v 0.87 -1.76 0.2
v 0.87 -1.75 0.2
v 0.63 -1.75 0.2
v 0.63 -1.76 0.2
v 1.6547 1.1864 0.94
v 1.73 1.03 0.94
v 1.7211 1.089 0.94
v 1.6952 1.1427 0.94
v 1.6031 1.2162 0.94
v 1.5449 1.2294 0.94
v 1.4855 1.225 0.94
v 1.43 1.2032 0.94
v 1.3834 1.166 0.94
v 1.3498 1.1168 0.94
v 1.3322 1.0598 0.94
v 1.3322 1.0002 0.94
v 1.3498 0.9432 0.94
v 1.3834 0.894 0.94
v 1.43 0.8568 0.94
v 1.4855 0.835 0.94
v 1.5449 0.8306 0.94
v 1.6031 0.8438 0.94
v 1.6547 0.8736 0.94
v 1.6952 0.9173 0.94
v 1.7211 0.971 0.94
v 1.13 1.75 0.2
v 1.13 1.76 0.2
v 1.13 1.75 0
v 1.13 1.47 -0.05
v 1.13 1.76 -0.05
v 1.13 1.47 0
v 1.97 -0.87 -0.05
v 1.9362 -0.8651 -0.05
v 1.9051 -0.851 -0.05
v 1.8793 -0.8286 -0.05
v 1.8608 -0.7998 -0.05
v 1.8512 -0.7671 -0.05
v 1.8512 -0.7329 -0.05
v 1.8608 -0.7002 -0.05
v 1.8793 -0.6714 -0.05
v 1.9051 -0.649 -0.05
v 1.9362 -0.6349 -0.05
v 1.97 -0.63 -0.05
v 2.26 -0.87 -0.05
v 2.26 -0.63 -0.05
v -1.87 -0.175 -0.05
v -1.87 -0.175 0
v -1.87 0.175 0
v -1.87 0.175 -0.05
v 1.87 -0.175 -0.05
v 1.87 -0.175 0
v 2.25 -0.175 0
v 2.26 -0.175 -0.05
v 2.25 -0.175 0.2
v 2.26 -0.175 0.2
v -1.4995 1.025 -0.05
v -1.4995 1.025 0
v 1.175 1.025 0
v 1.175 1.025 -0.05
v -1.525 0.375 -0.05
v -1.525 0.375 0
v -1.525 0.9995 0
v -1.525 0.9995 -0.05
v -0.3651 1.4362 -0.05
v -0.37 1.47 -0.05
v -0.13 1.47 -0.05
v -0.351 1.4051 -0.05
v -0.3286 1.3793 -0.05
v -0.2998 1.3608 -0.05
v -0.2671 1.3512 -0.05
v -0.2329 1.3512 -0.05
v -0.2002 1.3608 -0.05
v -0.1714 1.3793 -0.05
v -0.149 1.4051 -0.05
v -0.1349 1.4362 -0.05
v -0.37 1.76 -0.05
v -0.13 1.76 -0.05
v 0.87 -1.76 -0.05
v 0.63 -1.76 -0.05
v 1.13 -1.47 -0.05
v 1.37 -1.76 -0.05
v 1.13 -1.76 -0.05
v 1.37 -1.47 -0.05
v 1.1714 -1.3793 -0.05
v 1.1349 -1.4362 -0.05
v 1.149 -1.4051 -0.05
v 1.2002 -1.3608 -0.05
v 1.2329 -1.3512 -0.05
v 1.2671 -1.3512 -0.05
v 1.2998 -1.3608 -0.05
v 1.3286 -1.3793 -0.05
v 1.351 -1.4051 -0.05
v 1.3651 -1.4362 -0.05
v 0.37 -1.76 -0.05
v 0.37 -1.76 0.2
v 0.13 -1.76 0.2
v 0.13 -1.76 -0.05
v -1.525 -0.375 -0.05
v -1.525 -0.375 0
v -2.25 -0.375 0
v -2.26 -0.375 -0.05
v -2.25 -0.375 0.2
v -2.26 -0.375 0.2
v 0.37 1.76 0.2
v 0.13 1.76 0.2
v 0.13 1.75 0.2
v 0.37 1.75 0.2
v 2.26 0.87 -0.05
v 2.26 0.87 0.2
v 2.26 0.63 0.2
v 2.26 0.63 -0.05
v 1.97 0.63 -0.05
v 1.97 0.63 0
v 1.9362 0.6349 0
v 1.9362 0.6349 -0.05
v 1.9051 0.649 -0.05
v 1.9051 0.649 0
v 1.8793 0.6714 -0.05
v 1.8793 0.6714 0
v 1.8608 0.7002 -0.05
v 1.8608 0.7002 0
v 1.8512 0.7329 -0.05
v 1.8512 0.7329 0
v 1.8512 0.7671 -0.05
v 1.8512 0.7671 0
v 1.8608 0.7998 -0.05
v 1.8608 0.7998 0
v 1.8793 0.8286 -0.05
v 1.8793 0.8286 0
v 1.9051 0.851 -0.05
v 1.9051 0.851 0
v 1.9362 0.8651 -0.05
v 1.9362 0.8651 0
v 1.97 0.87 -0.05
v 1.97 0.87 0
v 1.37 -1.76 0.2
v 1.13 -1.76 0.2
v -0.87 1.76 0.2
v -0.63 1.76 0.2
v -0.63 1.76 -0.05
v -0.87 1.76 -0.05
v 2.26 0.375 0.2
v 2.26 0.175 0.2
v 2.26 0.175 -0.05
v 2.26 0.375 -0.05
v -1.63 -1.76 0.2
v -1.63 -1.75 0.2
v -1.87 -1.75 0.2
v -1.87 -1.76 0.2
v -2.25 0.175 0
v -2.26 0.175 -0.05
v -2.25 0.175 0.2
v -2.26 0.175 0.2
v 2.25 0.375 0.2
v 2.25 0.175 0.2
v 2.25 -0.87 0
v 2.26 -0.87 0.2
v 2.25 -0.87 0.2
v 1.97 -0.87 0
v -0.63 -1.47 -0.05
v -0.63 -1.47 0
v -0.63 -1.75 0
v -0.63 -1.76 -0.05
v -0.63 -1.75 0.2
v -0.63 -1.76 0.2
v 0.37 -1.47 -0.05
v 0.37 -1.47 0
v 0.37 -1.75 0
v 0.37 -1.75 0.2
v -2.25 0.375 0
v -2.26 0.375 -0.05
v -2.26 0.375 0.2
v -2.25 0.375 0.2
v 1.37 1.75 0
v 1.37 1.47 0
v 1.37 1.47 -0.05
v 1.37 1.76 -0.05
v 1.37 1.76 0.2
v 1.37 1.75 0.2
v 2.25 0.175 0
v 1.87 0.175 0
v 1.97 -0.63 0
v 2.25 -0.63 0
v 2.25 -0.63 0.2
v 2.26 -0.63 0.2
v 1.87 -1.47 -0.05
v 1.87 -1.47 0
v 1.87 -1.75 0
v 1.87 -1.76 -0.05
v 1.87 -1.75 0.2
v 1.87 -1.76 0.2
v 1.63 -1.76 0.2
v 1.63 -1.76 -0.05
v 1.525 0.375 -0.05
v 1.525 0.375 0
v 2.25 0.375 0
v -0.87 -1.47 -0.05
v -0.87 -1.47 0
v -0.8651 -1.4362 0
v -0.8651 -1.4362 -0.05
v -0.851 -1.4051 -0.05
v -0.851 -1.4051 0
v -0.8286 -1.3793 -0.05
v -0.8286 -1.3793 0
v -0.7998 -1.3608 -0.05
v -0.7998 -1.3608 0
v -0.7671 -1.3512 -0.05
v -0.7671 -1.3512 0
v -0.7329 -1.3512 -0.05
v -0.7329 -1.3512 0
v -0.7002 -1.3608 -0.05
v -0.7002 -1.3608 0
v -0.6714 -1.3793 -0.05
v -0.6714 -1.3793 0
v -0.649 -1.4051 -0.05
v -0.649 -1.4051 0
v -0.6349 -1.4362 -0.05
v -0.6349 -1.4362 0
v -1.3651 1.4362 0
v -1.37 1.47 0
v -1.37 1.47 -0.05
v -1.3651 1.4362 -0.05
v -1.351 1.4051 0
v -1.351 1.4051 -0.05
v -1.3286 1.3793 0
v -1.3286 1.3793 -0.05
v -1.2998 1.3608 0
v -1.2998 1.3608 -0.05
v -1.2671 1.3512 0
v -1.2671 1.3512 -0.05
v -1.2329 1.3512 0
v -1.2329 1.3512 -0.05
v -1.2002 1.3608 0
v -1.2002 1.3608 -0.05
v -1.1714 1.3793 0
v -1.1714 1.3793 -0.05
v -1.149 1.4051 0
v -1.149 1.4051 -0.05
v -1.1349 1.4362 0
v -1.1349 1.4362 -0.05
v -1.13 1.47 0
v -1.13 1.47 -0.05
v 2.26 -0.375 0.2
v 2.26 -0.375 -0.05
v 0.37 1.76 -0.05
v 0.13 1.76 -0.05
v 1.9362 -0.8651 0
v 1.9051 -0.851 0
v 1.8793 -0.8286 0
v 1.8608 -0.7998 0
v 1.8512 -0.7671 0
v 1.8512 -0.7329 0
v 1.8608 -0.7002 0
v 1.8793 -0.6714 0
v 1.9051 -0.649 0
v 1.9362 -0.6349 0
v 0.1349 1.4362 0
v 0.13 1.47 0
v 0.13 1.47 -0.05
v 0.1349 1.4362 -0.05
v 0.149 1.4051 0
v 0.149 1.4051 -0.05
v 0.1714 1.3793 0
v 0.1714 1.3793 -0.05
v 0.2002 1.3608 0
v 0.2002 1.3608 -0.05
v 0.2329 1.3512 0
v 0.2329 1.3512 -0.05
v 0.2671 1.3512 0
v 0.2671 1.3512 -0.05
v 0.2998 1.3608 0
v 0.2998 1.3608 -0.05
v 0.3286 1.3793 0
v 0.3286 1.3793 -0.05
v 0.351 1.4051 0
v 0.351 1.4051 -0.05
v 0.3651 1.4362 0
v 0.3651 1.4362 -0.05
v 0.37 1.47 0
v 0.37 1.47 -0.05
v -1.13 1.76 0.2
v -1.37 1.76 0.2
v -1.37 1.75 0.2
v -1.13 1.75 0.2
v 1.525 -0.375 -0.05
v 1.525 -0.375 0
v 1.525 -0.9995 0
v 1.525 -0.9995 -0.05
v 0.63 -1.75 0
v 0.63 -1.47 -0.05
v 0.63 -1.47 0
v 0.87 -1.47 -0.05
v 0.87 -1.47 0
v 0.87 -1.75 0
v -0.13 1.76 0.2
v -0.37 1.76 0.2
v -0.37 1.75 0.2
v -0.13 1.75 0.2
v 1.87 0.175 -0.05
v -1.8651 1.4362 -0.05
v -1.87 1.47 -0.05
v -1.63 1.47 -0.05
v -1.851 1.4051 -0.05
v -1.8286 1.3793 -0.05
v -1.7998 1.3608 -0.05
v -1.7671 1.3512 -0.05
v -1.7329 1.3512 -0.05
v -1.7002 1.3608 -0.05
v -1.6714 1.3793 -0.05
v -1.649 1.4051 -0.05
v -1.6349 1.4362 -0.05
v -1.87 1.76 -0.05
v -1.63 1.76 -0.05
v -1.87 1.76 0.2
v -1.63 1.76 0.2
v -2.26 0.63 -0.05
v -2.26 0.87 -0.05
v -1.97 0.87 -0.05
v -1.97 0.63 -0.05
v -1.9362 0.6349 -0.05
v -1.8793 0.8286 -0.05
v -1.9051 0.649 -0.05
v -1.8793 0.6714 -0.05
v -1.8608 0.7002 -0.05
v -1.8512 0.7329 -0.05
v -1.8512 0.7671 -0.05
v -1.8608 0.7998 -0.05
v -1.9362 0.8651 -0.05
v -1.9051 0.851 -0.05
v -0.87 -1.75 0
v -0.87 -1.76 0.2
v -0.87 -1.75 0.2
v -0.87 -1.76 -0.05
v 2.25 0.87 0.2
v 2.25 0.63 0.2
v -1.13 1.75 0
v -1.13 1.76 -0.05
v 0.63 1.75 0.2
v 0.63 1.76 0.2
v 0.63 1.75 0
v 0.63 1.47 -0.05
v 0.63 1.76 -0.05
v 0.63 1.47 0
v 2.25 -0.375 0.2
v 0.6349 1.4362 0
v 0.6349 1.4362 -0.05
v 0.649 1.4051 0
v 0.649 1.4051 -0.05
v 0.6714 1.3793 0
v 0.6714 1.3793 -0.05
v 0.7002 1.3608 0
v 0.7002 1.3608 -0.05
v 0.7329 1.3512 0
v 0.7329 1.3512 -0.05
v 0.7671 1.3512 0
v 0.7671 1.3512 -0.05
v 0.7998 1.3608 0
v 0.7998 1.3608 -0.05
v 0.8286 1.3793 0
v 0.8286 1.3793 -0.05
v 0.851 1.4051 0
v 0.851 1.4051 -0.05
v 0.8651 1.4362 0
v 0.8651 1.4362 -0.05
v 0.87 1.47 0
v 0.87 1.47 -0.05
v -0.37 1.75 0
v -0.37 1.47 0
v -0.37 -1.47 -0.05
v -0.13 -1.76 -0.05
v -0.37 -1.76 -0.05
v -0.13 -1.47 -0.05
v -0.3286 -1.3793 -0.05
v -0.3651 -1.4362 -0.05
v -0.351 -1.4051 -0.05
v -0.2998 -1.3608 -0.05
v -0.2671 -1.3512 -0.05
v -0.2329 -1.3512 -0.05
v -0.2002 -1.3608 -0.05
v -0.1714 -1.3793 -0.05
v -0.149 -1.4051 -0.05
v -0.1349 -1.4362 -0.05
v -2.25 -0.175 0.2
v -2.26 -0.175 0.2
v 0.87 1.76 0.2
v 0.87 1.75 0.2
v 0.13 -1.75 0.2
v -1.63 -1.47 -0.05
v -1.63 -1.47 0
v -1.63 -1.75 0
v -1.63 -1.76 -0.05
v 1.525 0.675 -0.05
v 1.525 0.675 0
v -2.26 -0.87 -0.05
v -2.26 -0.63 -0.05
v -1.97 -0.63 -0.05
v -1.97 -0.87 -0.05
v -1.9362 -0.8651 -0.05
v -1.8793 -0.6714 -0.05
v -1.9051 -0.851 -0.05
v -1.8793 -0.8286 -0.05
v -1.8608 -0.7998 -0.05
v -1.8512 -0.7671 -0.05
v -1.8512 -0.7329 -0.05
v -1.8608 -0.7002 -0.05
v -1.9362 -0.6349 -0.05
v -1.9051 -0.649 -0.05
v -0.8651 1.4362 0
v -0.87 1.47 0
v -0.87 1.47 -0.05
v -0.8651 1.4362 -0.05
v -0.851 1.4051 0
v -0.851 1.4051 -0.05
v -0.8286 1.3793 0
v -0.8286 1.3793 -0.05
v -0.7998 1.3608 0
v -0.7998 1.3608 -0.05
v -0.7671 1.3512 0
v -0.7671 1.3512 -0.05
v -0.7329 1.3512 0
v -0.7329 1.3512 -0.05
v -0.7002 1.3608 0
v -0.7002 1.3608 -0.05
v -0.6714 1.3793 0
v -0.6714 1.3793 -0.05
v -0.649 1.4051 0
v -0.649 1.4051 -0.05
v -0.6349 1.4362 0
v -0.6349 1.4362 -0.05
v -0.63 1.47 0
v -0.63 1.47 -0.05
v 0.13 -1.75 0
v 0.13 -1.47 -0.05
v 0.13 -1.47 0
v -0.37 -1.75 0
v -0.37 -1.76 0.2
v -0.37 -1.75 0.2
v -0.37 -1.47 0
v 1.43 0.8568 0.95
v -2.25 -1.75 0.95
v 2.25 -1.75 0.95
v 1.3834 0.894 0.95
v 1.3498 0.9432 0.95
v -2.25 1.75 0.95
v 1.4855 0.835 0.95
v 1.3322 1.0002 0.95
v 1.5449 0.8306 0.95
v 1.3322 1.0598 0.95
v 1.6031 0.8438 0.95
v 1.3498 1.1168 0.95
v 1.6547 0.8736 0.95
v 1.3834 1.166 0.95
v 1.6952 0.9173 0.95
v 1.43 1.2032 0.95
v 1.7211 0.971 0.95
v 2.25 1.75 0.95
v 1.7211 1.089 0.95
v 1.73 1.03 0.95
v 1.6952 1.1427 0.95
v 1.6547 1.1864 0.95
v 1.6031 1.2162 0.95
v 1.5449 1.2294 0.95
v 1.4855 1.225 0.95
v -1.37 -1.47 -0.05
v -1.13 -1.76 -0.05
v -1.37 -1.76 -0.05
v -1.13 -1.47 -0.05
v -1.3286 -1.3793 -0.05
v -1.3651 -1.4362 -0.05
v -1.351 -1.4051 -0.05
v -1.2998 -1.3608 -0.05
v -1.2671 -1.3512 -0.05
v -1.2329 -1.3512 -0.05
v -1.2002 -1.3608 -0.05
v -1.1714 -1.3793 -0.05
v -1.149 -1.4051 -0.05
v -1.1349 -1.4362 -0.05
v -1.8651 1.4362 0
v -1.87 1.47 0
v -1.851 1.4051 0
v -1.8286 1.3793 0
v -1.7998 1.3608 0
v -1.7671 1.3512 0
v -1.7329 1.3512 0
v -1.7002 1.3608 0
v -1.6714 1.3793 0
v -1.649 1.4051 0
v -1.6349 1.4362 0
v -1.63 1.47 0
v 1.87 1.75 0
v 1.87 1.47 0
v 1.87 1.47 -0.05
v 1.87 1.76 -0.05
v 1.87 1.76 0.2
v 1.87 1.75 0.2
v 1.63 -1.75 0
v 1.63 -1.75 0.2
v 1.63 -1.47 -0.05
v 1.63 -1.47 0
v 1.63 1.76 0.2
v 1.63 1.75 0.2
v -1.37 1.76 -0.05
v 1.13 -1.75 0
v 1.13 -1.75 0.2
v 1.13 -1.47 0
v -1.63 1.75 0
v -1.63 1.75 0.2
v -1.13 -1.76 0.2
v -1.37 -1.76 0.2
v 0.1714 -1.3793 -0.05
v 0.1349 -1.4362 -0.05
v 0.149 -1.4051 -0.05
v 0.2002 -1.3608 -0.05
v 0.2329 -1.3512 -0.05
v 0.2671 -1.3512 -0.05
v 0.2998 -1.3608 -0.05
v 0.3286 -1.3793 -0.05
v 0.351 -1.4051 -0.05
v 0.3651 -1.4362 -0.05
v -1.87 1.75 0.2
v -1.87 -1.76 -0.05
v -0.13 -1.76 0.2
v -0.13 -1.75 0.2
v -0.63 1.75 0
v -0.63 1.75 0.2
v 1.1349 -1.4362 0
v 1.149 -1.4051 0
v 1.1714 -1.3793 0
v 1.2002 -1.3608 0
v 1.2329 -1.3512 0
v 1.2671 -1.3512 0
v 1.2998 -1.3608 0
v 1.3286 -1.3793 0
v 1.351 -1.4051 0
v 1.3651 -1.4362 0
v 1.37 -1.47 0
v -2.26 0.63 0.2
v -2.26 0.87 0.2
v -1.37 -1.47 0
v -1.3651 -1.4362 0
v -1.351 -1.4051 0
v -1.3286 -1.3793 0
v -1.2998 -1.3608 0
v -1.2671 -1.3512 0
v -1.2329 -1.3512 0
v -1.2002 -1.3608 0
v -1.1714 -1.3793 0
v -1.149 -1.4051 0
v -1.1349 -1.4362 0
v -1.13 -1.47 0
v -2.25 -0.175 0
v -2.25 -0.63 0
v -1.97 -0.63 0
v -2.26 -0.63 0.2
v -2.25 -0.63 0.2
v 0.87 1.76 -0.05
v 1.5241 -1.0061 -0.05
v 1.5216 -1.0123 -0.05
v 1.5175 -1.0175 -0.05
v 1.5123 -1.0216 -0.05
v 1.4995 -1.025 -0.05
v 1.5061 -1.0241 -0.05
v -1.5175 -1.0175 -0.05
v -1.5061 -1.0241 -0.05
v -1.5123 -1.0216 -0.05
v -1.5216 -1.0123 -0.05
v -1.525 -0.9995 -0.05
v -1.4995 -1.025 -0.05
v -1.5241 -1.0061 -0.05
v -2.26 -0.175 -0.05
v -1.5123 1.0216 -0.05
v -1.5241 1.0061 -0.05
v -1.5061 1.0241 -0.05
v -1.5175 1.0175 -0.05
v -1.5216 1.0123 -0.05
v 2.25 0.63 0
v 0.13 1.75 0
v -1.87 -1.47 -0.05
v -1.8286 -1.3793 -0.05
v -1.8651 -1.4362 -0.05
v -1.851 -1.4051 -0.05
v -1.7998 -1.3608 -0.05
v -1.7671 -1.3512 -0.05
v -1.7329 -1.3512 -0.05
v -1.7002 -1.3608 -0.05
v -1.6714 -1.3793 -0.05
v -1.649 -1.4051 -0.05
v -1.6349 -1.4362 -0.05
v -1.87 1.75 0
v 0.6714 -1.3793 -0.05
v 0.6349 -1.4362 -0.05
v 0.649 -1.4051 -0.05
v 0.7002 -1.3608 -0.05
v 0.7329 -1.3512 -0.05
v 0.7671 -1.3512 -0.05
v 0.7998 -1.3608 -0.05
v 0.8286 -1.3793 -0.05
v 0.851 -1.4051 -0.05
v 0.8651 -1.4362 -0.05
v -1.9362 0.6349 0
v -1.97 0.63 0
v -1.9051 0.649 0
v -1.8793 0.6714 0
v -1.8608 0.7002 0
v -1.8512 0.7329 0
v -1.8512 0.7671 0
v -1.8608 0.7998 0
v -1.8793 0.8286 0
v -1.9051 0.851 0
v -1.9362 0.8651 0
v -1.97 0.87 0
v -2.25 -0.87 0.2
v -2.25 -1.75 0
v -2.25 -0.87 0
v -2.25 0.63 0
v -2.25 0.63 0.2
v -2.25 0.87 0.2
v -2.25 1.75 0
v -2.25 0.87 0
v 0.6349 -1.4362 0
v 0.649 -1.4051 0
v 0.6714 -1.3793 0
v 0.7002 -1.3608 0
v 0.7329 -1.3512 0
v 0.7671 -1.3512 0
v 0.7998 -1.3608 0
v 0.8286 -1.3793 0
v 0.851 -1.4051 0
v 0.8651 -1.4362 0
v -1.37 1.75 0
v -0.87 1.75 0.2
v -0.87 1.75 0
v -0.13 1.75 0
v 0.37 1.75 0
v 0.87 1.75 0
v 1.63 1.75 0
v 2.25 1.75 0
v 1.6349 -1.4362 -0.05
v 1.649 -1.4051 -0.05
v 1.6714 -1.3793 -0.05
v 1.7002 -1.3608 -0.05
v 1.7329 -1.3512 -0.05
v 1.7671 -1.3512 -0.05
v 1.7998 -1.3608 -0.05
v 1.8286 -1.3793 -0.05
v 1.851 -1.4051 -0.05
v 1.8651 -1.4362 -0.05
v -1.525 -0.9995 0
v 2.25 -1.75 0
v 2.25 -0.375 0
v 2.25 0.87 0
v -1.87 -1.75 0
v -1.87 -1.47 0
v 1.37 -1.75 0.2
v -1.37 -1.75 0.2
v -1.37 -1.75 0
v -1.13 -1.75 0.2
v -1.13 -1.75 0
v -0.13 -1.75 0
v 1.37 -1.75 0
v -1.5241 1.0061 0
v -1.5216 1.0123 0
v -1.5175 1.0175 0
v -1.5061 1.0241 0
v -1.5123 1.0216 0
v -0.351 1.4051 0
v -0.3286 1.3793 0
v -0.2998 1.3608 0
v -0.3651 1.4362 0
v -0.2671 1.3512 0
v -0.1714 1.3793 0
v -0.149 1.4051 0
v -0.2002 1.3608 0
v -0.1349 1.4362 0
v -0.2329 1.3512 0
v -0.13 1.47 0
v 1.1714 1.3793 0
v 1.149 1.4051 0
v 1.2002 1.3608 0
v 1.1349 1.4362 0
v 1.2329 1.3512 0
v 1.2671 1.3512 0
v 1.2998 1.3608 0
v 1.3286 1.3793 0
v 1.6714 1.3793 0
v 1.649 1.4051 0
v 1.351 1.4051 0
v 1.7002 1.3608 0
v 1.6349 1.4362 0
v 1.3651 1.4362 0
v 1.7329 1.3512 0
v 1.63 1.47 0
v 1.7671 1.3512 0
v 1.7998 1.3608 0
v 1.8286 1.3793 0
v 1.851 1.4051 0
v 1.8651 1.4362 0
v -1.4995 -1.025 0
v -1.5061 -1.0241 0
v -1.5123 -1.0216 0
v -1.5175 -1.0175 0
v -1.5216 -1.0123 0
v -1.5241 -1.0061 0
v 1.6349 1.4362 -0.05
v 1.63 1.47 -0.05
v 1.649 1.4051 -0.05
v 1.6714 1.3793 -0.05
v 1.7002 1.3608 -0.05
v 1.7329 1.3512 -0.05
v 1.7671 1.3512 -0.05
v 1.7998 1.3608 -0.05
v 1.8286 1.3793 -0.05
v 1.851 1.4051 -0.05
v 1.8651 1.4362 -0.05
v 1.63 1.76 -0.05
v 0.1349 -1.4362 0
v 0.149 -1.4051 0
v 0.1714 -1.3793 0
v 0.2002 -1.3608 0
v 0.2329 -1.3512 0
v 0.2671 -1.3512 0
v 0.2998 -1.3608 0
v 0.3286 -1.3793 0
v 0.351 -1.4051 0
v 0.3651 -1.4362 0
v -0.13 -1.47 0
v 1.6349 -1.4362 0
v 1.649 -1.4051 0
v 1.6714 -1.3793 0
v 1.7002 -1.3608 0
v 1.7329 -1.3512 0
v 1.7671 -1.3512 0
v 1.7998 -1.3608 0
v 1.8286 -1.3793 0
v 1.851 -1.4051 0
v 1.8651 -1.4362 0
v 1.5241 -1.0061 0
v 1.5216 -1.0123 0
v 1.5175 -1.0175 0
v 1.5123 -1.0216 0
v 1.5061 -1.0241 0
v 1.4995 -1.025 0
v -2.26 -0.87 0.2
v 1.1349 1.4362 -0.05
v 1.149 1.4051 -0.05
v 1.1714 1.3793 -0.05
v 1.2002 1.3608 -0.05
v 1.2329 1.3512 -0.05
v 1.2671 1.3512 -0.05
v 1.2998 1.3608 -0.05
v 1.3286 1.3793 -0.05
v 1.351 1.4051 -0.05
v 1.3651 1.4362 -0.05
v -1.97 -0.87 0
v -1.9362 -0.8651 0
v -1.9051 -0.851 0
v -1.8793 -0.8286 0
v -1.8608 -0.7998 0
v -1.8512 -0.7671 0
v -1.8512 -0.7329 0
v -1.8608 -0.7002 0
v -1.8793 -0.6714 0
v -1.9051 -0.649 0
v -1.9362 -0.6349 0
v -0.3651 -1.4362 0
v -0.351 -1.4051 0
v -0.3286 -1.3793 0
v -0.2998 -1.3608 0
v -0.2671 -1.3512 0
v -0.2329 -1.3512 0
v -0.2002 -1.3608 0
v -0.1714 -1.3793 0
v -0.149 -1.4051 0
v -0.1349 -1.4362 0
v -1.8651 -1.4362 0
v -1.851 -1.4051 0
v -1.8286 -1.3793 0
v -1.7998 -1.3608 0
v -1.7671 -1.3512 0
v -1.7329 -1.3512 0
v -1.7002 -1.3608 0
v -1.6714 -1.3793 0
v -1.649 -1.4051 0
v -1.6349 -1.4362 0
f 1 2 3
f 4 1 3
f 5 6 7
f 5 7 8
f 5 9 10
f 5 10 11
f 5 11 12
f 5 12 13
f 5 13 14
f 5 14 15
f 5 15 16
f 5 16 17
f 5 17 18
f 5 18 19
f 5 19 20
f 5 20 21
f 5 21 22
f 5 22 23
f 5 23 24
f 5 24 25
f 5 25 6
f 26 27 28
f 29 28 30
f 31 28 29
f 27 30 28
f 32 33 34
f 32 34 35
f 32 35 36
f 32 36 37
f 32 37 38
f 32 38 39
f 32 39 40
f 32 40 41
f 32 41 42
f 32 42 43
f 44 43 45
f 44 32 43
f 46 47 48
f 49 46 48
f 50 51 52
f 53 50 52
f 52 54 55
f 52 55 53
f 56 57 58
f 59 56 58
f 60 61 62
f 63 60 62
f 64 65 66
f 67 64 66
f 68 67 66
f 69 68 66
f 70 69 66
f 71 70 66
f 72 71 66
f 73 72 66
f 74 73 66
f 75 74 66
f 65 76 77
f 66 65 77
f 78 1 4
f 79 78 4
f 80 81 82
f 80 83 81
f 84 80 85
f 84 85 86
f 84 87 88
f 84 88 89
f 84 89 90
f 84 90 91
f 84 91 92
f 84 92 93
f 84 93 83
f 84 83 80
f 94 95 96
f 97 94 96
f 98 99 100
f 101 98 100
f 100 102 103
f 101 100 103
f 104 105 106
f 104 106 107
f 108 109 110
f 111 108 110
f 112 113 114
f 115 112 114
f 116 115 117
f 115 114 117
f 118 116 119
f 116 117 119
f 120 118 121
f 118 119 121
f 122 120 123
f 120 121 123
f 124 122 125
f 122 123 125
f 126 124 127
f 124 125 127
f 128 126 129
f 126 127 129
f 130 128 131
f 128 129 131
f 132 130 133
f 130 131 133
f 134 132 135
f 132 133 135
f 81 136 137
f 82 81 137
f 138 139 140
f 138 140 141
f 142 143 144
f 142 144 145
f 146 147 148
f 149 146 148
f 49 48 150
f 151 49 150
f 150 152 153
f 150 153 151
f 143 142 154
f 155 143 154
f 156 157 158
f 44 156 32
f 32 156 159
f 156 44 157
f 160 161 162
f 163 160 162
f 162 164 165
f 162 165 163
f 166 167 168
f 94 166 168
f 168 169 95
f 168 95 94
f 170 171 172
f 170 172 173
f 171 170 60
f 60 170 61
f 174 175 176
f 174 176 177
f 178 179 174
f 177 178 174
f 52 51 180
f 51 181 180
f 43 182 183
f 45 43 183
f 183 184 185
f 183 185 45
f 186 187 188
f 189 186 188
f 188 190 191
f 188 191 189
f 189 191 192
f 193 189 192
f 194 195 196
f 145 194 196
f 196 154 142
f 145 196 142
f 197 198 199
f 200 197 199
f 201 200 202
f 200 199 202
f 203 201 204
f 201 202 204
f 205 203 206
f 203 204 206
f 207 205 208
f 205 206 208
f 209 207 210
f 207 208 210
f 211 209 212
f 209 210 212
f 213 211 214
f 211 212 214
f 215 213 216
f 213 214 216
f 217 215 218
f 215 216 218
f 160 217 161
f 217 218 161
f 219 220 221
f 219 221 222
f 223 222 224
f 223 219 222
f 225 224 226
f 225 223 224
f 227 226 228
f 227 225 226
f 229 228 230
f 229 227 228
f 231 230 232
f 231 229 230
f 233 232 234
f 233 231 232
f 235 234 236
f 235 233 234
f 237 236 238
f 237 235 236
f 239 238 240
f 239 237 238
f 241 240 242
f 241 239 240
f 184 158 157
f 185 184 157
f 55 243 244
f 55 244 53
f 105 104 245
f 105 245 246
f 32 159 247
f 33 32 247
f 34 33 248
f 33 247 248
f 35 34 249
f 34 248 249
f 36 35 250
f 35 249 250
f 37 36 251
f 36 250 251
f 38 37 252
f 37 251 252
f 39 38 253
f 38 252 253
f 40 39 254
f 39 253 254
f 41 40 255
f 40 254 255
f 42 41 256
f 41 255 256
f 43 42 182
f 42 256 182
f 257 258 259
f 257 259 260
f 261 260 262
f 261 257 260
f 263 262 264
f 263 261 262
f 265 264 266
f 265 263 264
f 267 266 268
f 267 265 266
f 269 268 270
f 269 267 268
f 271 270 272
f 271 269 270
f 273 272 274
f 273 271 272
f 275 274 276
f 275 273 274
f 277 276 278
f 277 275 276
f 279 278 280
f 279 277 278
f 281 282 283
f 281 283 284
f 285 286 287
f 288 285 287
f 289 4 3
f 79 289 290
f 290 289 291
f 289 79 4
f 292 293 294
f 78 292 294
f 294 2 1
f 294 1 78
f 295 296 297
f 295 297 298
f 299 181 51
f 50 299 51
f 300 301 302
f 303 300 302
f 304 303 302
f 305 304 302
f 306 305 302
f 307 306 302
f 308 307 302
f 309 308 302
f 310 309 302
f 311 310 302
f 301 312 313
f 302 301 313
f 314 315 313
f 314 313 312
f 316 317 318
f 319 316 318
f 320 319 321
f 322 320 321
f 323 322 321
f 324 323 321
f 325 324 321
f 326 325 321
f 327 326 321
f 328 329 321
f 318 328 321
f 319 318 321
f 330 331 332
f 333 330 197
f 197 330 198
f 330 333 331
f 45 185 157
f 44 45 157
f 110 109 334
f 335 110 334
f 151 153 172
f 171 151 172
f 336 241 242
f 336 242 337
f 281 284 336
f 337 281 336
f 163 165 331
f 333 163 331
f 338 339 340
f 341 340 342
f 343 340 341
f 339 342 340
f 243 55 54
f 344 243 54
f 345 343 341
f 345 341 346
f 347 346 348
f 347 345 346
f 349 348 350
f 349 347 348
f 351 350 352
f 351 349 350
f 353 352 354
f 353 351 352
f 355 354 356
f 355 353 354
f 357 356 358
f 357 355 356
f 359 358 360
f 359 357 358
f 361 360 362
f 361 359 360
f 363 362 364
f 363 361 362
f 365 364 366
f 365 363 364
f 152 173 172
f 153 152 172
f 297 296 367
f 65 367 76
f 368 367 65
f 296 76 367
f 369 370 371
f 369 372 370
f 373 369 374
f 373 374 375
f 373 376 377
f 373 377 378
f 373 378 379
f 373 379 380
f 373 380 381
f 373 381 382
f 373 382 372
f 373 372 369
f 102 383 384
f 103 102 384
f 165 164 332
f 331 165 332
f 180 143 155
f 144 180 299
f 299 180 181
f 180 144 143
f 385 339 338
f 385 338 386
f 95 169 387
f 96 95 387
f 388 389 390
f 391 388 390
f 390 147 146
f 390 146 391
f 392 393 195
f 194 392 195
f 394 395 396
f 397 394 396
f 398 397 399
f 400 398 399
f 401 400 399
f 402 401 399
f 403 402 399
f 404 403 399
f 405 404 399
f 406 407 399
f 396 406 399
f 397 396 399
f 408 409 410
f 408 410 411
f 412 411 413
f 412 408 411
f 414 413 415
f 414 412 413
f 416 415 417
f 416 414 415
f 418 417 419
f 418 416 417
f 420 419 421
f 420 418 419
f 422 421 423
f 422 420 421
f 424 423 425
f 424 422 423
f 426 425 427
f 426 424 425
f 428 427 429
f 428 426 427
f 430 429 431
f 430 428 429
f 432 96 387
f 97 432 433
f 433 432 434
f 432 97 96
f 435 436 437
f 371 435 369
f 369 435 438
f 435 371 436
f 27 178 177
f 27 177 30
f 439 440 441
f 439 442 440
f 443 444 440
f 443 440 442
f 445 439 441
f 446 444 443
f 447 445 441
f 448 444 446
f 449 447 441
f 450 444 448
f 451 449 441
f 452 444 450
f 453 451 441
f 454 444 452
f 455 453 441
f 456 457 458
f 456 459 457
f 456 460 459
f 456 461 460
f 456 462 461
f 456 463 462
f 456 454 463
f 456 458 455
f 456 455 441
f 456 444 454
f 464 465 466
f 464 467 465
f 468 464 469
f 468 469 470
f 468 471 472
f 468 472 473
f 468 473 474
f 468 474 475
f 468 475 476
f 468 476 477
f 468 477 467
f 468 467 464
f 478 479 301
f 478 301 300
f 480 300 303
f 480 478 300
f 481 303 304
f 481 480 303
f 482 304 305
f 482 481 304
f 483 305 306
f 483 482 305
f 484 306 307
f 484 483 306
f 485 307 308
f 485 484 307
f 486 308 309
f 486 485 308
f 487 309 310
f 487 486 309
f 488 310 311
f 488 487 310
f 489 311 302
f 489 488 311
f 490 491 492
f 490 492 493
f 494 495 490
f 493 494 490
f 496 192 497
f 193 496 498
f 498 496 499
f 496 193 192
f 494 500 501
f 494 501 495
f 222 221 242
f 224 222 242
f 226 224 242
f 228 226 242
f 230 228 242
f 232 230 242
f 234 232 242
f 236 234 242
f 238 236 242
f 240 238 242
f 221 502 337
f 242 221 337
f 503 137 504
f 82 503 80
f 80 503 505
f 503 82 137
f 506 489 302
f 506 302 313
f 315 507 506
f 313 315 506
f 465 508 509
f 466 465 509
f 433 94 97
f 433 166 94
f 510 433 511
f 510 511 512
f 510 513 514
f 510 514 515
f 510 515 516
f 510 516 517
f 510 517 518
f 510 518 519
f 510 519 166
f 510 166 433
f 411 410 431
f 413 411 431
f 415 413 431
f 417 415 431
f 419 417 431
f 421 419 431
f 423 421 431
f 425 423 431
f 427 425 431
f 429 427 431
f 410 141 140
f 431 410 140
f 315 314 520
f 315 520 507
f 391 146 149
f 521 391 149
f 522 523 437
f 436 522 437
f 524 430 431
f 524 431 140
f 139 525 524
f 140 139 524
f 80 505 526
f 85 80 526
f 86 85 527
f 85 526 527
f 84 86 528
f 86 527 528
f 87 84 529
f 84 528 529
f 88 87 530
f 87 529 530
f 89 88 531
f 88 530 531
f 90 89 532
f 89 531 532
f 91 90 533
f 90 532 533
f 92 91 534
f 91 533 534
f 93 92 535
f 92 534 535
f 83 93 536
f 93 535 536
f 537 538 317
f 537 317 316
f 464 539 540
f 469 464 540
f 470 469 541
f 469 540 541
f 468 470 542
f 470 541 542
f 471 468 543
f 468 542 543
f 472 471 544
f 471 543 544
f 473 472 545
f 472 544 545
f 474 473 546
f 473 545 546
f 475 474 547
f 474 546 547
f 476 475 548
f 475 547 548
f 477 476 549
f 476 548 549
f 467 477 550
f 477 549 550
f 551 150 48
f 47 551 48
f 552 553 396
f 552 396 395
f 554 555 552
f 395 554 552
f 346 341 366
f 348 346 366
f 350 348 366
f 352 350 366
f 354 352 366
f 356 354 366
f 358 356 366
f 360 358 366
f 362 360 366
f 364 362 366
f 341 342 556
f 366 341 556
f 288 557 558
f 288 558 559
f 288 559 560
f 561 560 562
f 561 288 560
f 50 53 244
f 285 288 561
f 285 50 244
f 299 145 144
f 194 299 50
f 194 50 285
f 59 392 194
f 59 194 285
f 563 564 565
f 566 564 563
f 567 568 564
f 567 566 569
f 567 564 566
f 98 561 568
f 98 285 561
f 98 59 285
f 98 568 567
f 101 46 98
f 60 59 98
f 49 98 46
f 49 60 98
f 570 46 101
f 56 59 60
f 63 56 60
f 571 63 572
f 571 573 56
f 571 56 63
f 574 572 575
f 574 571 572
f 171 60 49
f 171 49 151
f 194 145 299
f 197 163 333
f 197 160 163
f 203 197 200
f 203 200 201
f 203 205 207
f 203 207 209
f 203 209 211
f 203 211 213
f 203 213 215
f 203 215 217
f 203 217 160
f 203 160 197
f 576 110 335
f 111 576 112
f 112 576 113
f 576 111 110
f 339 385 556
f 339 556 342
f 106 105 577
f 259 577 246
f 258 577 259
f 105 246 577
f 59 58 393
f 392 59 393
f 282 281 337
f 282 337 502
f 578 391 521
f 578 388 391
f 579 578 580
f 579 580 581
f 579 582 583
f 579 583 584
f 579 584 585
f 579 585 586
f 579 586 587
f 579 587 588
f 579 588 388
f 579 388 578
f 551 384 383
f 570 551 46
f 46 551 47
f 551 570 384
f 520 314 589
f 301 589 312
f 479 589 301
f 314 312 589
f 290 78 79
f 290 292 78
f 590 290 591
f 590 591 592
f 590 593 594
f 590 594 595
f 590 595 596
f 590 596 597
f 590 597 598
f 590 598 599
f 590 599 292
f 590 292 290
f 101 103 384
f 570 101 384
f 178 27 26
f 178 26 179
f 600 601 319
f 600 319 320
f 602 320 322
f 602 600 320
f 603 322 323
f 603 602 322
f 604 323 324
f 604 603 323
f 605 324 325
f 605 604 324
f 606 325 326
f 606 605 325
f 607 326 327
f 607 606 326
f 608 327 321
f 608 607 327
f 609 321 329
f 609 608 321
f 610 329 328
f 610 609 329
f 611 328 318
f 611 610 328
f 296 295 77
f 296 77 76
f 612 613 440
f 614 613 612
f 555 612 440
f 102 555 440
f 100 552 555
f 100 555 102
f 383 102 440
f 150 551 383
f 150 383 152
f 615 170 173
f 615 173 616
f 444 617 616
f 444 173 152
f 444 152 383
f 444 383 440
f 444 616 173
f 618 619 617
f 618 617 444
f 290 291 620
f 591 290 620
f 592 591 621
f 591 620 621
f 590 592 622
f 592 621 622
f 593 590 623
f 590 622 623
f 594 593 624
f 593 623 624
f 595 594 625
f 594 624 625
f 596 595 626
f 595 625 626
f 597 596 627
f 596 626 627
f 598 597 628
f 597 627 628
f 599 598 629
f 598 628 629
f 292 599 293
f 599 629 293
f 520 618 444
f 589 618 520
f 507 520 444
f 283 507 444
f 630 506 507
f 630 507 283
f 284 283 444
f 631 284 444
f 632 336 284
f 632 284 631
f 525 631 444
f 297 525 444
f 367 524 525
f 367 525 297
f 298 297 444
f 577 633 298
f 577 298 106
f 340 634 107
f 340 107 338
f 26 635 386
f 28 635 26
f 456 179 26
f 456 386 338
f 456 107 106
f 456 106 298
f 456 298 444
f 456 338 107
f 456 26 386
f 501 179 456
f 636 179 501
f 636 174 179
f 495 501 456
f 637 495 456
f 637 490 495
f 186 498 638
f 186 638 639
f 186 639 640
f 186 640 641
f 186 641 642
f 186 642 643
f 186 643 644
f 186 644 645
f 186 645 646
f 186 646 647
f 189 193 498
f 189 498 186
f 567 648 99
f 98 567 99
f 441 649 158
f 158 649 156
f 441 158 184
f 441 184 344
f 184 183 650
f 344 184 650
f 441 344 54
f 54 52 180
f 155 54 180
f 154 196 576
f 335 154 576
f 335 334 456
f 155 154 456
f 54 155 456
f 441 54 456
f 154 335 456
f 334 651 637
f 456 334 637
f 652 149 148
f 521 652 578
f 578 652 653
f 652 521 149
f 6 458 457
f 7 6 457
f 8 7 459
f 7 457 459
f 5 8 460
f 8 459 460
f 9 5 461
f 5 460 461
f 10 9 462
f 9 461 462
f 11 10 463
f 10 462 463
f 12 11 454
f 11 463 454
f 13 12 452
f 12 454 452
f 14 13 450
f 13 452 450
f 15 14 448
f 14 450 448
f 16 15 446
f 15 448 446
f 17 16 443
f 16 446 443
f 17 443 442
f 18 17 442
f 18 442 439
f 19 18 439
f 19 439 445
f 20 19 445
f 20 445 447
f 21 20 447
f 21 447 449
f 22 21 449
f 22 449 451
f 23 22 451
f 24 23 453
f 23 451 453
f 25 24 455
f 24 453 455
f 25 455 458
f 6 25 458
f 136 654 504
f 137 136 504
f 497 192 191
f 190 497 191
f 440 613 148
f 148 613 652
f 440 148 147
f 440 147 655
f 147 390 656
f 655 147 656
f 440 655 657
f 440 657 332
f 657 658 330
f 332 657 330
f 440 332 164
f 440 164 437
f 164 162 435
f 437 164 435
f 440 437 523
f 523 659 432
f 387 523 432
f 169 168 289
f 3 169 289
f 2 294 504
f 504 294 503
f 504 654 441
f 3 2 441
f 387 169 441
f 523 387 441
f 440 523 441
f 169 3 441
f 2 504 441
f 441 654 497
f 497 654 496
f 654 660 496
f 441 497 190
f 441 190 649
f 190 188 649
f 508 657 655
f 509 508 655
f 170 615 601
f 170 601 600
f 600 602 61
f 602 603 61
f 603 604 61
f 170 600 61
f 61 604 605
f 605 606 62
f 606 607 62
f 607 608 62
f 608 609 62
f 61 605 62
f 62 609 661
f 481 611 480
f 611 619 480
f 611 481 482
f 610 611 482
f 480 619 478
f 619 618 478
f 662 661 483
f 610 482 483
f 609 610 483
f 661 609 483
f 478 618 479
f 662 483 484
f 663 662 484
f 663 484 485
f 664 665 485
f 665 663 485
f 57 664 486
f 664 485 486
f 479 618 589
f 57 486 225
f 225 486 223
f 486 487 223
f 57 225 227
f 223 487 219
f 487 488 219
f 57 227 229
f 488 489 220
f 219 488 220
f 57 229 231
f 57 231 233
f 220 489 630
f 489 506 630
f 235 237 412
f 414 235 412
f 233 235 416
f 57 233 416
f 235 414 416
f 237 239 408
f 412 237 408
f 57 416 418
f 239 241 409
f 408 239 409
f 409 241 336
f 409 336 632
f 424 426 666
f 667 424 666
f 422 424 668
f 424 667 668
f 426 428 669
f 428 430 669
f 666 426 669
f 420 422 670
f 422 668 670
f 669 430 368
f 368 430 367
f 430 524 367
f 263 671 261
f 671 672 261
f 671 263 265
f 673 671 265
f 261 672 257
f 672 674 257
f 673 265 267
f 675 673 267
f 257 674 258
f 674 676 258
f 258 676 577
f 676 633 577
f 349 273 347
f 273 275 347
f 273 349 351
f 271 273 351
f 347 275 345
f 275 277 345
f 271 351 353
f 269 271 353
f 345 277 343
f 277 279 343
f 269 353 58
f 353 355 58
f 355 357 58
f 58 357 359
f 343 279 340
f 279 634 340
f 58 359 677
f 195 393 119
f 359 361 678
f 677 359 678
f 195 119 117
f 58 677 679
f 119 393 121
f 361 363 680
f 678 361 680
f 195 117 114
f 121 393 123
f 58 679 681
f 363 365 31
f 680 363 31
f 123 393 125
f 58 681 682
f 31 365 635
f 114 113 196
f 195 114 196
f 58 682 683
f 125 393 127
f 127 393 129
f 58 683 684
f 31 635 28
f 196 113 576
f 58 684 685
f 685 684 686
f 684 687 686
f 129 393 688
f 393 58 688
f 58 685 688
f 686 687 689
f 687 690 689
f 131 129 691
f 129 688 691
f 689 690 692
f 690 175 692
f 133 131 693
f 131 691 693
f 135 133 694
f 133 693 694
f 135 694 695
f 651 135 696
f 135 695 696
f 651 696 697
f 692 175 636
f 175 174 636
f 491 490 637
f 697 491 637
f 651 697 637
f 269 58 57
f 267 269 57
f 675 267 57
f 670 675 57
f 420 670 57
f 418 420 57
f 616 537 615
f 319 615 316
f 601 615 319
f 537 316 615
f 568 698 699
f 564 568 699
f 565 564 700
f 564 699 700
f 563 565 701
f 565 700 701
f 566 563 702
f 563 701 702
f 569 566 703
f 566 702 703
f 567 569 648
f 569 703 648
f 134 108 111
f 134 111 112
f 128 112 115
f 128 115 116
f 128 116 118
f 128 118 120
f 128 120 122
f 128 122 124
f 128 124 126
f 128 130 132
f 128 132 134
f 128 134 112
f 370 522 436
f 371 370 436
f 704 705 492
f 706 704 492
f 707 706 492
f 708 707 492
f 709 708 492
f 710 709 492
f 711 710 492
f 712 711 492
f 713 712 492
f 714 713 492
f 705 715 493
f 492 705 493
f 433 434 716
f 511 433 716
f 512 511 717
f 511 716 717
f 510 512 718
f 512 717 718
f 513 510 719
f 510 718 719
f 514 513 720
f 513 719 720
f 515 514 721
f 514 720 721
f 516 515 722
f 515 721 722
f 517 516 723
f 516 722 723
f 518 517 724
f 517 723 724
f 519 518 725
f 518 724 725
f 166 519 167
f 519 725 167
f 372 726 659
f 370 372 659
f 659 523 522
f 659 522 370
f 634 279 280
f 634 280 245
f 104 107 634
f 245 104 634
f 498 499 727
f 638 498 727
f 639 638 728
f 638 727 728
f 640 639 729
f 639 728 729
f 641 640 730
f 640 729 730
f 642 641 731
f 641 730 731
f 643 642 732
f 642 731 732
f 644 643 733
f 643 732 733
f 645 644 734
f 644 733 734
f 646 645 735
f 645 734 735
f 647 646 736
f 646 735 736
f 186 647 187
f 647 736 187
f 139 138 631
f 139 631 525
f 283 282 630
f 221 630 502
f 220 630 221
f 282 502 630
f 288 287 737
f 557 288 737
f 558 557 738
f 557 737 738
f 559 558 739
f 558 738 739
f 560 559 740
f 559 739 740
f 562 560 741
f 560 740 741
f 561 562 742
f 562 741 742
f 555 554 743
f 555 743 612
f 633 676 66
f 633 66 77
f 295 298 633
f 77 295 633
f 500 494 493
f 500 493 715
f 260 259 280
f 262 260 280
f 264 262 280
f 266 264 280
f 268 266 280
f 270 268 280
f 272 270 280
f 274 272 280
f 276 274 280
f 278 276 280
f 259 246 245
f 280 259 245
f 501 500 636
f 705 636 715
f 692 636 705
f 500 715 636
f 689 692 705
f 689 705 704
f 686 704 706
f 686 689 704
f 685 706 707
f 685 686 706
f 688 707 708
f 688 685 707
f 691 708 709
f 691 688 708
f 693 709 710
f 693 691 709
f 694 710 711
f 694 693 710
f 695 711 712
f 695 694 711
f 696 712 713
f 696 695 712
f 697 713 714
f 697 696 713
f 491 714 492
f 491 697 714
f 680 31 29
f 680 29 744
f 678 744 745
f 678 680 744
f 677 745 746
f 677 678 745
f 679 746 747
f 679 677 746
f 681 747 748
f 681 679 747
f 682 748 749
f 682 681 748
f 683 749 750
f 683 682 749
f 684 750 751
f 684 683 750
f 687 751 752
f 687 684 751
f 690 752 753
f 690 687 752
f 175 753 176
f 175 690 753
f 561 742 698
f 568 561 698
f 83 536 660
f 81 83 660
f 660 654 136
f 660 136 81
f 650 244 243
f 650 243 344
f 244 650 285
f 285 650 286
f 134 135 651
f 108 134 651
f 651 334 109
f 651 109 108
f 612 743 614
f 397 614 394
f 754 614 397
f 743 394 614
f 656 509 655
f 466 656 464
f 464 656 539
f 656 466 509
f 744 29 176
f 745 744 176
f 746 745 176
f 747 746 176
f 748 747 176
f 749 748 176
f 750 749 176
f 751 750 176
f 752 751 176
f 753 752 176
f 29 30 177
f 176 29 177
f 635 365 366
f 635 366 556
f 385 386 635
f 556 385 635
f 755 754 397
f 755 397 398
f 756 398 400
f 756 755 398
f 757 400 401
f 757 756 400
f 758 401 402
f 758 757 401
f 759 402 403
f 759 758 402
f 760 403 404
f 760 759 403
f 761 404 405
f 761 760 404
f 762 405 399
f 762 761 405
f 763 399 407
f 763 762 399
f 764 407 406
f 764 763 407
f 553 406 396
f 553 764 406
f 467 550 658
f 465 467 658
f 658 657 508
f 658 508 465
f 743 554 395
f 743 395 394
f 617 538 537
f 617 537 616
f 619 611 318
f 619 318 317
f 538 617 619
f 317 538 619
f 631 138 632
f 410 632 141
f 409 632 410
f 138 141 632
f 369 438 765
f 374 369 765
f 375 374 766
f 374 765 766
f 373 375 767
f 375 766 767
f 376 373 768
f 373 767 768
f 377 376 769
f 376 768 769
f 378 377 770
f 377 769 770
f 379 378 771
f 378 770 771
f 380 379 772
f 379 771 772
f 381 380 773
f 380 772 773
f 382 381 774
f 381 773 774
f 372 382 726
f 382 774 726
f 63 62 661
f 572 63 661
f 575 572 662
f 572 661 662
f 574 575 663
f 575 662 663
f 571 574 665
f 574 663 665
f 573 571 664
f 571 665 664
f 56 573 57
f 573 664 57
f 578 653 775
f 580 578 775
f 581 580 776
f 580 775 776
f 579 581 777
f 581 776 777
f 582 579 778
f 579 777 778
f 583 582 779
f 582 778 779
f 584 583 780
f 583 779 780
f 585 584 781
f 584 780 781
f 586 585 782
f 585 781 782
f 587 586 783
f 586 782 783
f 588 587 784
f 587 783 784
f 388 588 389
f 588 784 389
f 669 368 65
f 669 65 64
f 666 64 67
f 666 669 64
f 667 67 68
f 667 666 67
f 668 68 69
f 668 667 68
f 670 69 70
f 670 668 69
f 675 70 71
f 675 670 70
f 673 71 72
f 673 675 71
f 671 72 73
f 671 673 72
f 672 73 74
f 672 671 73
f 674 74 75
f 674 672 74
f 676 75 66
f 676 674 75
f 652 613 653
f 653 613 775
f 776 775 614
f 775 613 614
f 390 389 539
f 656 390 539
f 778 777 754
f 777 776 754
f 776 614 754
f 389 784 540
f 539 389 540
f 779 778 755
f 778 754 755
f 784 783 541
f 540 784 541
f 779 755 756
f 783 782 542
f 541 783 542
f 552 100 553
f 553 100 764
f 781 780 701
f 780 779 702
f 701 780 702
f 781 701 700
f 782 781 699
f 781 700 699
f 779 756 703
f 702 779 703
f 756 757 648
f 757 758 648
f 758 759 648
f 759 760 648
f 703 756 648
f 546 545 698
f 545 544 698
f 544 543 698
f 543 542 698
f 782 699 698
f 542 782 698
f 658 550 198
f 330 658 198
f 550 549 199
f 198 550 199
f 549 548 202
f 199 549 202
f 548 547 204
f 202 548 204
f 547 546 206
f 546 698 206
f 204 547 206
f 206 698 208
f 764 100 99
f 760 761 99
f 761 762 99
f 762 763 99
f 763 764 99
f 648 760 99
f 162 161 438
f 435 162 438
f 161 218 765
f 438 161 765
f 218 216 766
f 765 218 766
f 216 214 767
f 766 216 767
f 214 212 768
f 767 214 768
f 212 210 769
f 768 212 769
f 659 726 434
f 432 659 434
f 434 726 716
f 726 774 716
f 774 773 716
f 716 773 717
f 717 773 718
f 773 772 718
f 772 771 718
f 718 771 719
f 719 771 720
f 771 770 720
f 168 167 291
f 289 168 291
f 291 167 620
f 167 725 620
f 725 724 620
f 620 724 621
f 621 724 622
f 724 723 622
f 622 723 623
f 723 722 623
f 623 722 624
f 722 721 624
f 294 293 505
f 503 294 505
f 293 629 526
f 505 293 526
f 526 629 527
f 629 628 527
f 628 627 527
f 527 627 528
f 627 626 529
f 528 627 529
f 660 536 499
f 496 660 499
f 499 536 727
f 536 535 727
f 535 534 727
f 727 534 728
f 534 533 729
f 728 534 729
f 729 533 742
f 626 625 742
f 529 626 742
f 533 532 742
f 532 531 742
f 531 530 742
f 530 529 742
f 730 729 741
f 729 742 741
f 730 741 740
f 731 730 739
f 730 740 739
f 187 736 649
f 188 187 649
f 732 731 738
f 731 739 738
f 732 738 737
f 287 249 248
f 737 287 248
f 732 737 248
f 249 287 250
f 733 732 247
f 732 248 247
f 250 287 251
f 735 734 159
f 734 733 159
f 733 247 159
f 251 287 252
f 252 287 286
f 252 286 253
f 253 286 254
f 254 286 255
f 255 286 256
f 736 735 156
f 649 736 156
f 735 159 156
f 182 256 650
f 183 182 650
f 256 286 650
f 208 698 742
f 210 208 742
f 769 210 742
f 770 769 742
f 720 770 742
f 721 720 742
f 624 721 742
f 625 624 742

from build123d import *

# Parameters (mm, degrees)
SKETCH1_W                = 4.5
SKETCH1_H                = 3.5
BOSS_EXTRUDE1_DEPTH      = 0.95
SKETCH2_R                = 0.2
CUT_EXTRUDE1_DEPTH       = 0.01
BOSS_EXTRUDE2_DEPTH      = 0.05
BOSS_EXTRUDE2_DEPTH_BACK = 0.2
SKETCH3_W                = 0.01
SKETCH3_H                = 0.2
BOSS_EXTRUDE3_START      = -0.2
BOSS_EXTRUDE3_DEPTH      = 0.25
LPATTERN1_COUNT          = 2
LPATTERN1_PITCH          = 1.5
MIRROR1_START            = -0.2
MIRROR1_COPY_1_DEPTH     = 0.25
BOSS_EXTRUDE4_START      = -0.2
BOSS_EXTRUDE4_DEPTH      = 0.25
LPATTERN2_COUNT          = 8
LPATTERN2_PITCH          = 0.5
MIRROR2_START            = -0.2
MIRROR2_COPY_1_DEPTH     = 0.25
MIRROR2_COPY_2_DEPTH     = 0.25
MIRROR2_COPY_3_DEPTH     = 0.25
MIRROR2_COPY_4_DEPTH     = 0.25
MIRROR2_COPY_5_DEPTH     = 0.25
MIRROR2_COPY_6_DEPTH     = 0.25
MIRROR2_COPY_7_DEPTH     = 0.25


with BuildPart() as part:
    # Sketch1 → Boss-Extrude1 (new body)
    with BuildSketch(Plane.XY):
        Rectangle(SKETCH1_W, SKETCH1_H)
    extrude(amount=BOSS_EXTRUDE1_DEPTH)

    # Sketch2 → Cut-Extrude1 (cut)
    with BuildSketch(Plane.XY.offset(0.95)):
        with Locations((1.53, 1.03)):
            Circle(SKETCH2_R)
    extrude(amount=-CUT_EXTRUDE1_DEPTH, mode=Mode.SUBTRACT)

    # Sketch3 → Boss-Extrude2 (add, two sides: drawn at the far end of the back side and taken through both)
    with BuildSketch(Plane(origin=(0, 0, 0), x_dir=(-1, 0, 0), z_dir=(0, 0, -1)).offset(-BOSS_EXTRUDE2_DEPTH_BACK)):
        with BuildLine():
            Line((2.25, 0.375), (1.525, 0.375))
            Line((1.525, 0.375), (1.525, 0.9995))
            ThreePointArc((1.525, 0.9995), (1.517531223, 1.017531223), (1.4995, 1.025))
            Line((1.4995, 1.025), (-1.175, 1.025))
            Line((-1.175, 1.025), (-1.525, 0.675))
            Line((-1.525, 0.675), (-1.525, 0.375))
            Line((-1.525, 0.375), (-2.25, 0.375))
            Line((-2.25, 0.375), (-2.25, 0.175))
            Line((-2.25, 0.175), (-1.87, 0.175))
            Line((-1.87, 0.175), (-1.87, -0.175))
            Line((-1.87, -0.175), (-2.25, -0.175))
            Line((-2.25, -0.175), (-2.25, -0.375))
            Line((-2.25, -0.375), (-1.525, -0.375))
            Line((-1.525, -0.375), (-1.525, -0.9995))
            ThreePointArc((-1.525, -0.9995), (-1.517531223, -1.017531223), (-1.4995, -1.025))
            Line((-1.4995, -1.025), (1.4995, -1.025))
            ThreePointArc((1.4995, -1.025), (1.517531223, -1.017531223), (1.525, -0.9995))
            Line((1.525, -0.9995), (1.525, -0.375))
            Line((1.525, -0.375), (2.25, -0.375))
            Line((2.25, -0.375), (2.25, -0.175))
            Line((2.25, -0.175), (1.87, -0.175))
            Line((1.87, -0.175), (1.87, 0.175))
            Line((1.87, 0.175), (2.25, 0.175))
            Line((2.25, 0.175), (2.25, 0.375))
        make_face()
        with Locations((2.255, 0.275)):
            Rectangle(SKETCH3_W, SKETCH3_H)
        with Locations((2.255, -0.275)):
            Rectangle(SKETCH3_W, SKETCH3_H)
        with Locations((-2.255, -0.275)):
            Rectangle(SKETCH3_W, SKETCH3_H)
        with Locations((-2.255, 0.275)):
            Rectangle(SKETCH3_W, SKETCH3_H)
    extrude(amount=BOSS_EXTRUDE2_DEPTH + BOSS_EXTRUDE2_DEPTH_BACK)

    # Sketch5 → Boss-Extrude3 (add)
    with BuildSketch(Plane(origin=(0, 0, 0), x_dir=(-1, 0, 0), z_dir=(0, 0, -1)).offset(BOSS_EXTRUDE3_START)):
        with BuildLine():
            Line((1.97, 0.87), (2.25, 0.87))
            Line((2.25, 0.87), (2.26, 0.87))
            Line((2.26, 0.87), (2.26, 0.63))
            Line((2.26, 0.63), (2.25, 0.63))
            Line((2.25, 0.63), (1.97, 0.63))
            ThreePointArc((1.97, 0.63), (1.85, 0.75), (1.97, 0.87))
        make_face()
    boss_extrude3 = extrude(amount=BOSS_EXTRUDE3_DEPTH)

    # LPattern1: Boss-Extrude3 ×2
    with Locations(*[(0, -i * LPATTERN1_PITCH, 0) for i in range(1, LPATTERN1_COUNT)]):
        add(boss_extrude3)

    # Mirror1: Boss-Extrude3 across plane
    add(boss_extrude3.mirror(Plane(origin=(0, 0, 0), x_dir=(0, 0, 1), z_dir=(1, 0, 0))))

    # Mirror1 copy 1 sketch → Mirror1 copy 1 (add)
    with BuildSketch(Plane(origin=(0, -1.5, 0), x_dir=(1, 0, 0), z_dir=(0, 0, -1)).offset(MIRROR1_START)):
        with BuildLine():
            Line((1.97, -0.87), (2.25, -0.87))
            Line((2.25, -0.87), (2.26, -0.87))
            Line((2.26, -0.87), (2.26, -0.63))
            Line((2.26, -0.63), (2.25, -0.63))
            Line((2.25, -0.63), (1.97, -0.63))
            ThreePointArc((1.97, -0.63), (1.85, -0.75), (1.97, -0.87))
        make_face()
    extrude(amount=MIRROR1_COPY_1_DEPTH)

    # Sketch6 → Boss-Extrude4 (add)
    with BuildSketch(Plane(origin=(0, 0, 0), x_dir=(-1, 0, 0), z_dir=(0, 0, -1)).offset(BOSS_EXTRUDE4_START)):
        with BuildLine():
            Line((-1.87, 1.76), (-1.63, 1.76))
            Line((-1.63, 1.76), (-1.63, 1.75))
            Line((-1.63, 1.75), (-1.63, 1.47))
            ThreePointArc((-1.63, 1.47), (-1.75, 1.35), (-1.87, 1.47))
            Line((-1.87, 1.47), (-1.87, 1.75))
            Line((-1.87, 1.75), (-1.87, 1.76))
        make_face()
    boss_extrude4 = extrude(amount=BOSS_EXTRUDE4_DEPTH)

    # LPattern2: Boss-Extrude4 ×8
    with Locations(*[(-i * LPATTERN2_PITCH, 0, 0) for i in range(1, LPATTERN2_COUNT)]):
        add(boss_extrude4)

    # Mirror2: Boss-Extrude4 across plane
    add(boss_extrude4.mirror(Plane.ZX))

    # Mirror2 copy 1 sketch → Mirror2 copy 1 (add)
    with BuildSketch(Plane(origin=(-0.5, 0, 0), x_dir=(-1, 0, 0), z_dir=(0, 0, -1)).offset(MIRROR2_START)):
        with BuildLine():
            Line((-1.87, -1.76), (-1.63, -1.76))
            Line((-1.63, -1.76), (-1.63, -1.75))
            Line((-1.63, -1.75), (-1.63, -1.47))
            ThreePointArc((-1.63, -1.47), (-1.75, -1.35), (-1.87, -1.47))
            Line((-1.87, -1.47), (-1.87, -1.75))
            Line((-1.87, -1.75), (-1.87, -1.76))
        make_face()
    extrude(amount=MIRROR2_COPY_1_DEPTH)

    # Mirror2 copy 2 sketch → Mirror2 copy 2 (add)
    with BuildSketch(Plane(origin=(-1, 0, 0), x_dir=(-1, 0, 0), z_dir=(0, 0, -1)).offset(MIRROR2_START)):
        with BuildLine():
            Line((-1.87, -1.76), (-1.63, -1.76))
            Line((-1.63, -1.76), (-1.63, -1.75))
            Line((-1.63, -1.75), (-1.63, -1.47))
            ThreePointArc((-1.63, -1.47), (-1.75, -1.35), (-1.87, -1.47))
            Line((-1.87, -1.47), (-1.87, -1.75))
            Line((-1.87, -1.75), (-1.87, -1.76))
        make_face()
    extrude(amount=MIRROR2_COPY_2_DEPTH)

    # Mirror2 copy 3 sketch → Mirror2 copy 3 (add)
    with BuildSketch(Plane(origin=(-1.5, 0, 0), x_dir=(-1, 0, 0), z_dir=(0, 0, -1)).offset(MIRROR2_START)):
        with BuildLine():
            Line((-1.87, -1.76), (-1.63, -1.76))
            Line((-1.63, -1.76), (-1.63, -1.75))
            Line((-1.63, -1.75), (-1.63, -1.47))
            ThreePointArc((-1.63, -1.47), (-1.75, -1.35), (-1.87, -1.47))
            Line((-1.87, -1.47), (-1.87, -1.75))
            Line((-1.87, -1.75), (-1.87, -1.76))
        make_face()
    extrude(amount=MIRROR2_COPY_3_DEPTH)

    # Mirror2 copy 4 sketch → Mirror2 copy 4 (add)
    with BuildSketch(Plane(origin=(-2, 0, 0), x_dir=(-1, 0, 0), z_dir=(0, 0, -1)).offset(MIRROR2_START)):
        with BuildLine():
            Line((-1.87, -1.76), (-1.63, -1.76))
            Line((-1.63, -1.76), (-1.63, -1.75))
            Line((-1.63, -1.75), (-1.63, -1.47))
            ThreePointArc((-1.63, -1.47), (-1.75, -1.35), (-1.87, -1.47))
            Line((-1.87, -1.47), (-1.87, -1.75))
            Line((-1.87, -1.75), (-1.87, -1.76))
        make_face()
    extrude(amount=MIRROR2_COPY_4_DEPTH)

    # Mirror2 copy 5 sketch → Mirror2 copy 5 (add)
    with BuildSketch(Plane(origin=(-2.5, 0, 0), x_dir=(-1, 0, 0), z_dir=(0, 0, -1)).offset(MIRROR2_START)):
        with BuildLine():
            Line((-1.87, -1.76), (-1.63, -1.76))
            Line((-1.63, -1.76), (-1.63, -1.75))
            Line((-1.63, -1.75), (-1.63, -1.47))
            ThreePointArc((-1.63, -1.47), (-1.75, -1.35), (-1.87, -1.47))
            Line((-1.87, -1.47), (-1.87, -1.75))
            Line((-1.87, -1.75), (-1.87, -1.76))
        make_face()
    extrude(amount=MIRROR2_COPY_5_DEPTH)

    # Mirror2 copy 6 sketch → Mirror2 copy 6 (add)
    with BuildSketch(Plane(origin=(-3, 0, 0), x_dir=(-1, 0, 0), z_dir=(0, 0, -1)).offset(MIRROR2_START)):
        with BuildLine():
            Line((-1.87, -1.76), (-1.63, -1.76))
            Line((-1.63, -1.76), (-1.63, -1.75))
            Line((-1.63, -1.75), (-1.63, -1.47))
            ThreePointArc((-1.63, -1.47), (-1.75, -1.35), (-1.87, -1.47))
            Line((-1.87, -1.47), (-1.87, -1.75))
            Line((-1.87, -1.75), (-1.87, -1.76))
        make_face()
    extrude(amount=MIRROR2_COPY_6_DEPTH)

    # Mirror2 copy 7 sketch → Mirror2 copy 7 (add)
    with BuildSketch(Plane(origin=(-3.5, 0, 0), x_dir=(-1, 0, 0), z_dir=(0, 0, -1)).offset(MIRROR2_START)):
        with BuildLine():
            Line((-1.87, -1.76), (-1.63, -1.76))
            Line((-1.63, -1.76), (-1.63, -1.75))
            Line((-1.63, -1.75), (-1.63, -1.47))
            ThreePointArc((-1.63, -1.47), (-1.75, -1.35), (-1.87, -1.47))
            Line((-1.87, -1.47), (-1.87, -1.75))
            Line((-1.87, -1.75), (-1.87, -1.76))
        make_face()
    extrude(amount=MIRROR2_COPY_7_DEPTH)


solid = part.part
